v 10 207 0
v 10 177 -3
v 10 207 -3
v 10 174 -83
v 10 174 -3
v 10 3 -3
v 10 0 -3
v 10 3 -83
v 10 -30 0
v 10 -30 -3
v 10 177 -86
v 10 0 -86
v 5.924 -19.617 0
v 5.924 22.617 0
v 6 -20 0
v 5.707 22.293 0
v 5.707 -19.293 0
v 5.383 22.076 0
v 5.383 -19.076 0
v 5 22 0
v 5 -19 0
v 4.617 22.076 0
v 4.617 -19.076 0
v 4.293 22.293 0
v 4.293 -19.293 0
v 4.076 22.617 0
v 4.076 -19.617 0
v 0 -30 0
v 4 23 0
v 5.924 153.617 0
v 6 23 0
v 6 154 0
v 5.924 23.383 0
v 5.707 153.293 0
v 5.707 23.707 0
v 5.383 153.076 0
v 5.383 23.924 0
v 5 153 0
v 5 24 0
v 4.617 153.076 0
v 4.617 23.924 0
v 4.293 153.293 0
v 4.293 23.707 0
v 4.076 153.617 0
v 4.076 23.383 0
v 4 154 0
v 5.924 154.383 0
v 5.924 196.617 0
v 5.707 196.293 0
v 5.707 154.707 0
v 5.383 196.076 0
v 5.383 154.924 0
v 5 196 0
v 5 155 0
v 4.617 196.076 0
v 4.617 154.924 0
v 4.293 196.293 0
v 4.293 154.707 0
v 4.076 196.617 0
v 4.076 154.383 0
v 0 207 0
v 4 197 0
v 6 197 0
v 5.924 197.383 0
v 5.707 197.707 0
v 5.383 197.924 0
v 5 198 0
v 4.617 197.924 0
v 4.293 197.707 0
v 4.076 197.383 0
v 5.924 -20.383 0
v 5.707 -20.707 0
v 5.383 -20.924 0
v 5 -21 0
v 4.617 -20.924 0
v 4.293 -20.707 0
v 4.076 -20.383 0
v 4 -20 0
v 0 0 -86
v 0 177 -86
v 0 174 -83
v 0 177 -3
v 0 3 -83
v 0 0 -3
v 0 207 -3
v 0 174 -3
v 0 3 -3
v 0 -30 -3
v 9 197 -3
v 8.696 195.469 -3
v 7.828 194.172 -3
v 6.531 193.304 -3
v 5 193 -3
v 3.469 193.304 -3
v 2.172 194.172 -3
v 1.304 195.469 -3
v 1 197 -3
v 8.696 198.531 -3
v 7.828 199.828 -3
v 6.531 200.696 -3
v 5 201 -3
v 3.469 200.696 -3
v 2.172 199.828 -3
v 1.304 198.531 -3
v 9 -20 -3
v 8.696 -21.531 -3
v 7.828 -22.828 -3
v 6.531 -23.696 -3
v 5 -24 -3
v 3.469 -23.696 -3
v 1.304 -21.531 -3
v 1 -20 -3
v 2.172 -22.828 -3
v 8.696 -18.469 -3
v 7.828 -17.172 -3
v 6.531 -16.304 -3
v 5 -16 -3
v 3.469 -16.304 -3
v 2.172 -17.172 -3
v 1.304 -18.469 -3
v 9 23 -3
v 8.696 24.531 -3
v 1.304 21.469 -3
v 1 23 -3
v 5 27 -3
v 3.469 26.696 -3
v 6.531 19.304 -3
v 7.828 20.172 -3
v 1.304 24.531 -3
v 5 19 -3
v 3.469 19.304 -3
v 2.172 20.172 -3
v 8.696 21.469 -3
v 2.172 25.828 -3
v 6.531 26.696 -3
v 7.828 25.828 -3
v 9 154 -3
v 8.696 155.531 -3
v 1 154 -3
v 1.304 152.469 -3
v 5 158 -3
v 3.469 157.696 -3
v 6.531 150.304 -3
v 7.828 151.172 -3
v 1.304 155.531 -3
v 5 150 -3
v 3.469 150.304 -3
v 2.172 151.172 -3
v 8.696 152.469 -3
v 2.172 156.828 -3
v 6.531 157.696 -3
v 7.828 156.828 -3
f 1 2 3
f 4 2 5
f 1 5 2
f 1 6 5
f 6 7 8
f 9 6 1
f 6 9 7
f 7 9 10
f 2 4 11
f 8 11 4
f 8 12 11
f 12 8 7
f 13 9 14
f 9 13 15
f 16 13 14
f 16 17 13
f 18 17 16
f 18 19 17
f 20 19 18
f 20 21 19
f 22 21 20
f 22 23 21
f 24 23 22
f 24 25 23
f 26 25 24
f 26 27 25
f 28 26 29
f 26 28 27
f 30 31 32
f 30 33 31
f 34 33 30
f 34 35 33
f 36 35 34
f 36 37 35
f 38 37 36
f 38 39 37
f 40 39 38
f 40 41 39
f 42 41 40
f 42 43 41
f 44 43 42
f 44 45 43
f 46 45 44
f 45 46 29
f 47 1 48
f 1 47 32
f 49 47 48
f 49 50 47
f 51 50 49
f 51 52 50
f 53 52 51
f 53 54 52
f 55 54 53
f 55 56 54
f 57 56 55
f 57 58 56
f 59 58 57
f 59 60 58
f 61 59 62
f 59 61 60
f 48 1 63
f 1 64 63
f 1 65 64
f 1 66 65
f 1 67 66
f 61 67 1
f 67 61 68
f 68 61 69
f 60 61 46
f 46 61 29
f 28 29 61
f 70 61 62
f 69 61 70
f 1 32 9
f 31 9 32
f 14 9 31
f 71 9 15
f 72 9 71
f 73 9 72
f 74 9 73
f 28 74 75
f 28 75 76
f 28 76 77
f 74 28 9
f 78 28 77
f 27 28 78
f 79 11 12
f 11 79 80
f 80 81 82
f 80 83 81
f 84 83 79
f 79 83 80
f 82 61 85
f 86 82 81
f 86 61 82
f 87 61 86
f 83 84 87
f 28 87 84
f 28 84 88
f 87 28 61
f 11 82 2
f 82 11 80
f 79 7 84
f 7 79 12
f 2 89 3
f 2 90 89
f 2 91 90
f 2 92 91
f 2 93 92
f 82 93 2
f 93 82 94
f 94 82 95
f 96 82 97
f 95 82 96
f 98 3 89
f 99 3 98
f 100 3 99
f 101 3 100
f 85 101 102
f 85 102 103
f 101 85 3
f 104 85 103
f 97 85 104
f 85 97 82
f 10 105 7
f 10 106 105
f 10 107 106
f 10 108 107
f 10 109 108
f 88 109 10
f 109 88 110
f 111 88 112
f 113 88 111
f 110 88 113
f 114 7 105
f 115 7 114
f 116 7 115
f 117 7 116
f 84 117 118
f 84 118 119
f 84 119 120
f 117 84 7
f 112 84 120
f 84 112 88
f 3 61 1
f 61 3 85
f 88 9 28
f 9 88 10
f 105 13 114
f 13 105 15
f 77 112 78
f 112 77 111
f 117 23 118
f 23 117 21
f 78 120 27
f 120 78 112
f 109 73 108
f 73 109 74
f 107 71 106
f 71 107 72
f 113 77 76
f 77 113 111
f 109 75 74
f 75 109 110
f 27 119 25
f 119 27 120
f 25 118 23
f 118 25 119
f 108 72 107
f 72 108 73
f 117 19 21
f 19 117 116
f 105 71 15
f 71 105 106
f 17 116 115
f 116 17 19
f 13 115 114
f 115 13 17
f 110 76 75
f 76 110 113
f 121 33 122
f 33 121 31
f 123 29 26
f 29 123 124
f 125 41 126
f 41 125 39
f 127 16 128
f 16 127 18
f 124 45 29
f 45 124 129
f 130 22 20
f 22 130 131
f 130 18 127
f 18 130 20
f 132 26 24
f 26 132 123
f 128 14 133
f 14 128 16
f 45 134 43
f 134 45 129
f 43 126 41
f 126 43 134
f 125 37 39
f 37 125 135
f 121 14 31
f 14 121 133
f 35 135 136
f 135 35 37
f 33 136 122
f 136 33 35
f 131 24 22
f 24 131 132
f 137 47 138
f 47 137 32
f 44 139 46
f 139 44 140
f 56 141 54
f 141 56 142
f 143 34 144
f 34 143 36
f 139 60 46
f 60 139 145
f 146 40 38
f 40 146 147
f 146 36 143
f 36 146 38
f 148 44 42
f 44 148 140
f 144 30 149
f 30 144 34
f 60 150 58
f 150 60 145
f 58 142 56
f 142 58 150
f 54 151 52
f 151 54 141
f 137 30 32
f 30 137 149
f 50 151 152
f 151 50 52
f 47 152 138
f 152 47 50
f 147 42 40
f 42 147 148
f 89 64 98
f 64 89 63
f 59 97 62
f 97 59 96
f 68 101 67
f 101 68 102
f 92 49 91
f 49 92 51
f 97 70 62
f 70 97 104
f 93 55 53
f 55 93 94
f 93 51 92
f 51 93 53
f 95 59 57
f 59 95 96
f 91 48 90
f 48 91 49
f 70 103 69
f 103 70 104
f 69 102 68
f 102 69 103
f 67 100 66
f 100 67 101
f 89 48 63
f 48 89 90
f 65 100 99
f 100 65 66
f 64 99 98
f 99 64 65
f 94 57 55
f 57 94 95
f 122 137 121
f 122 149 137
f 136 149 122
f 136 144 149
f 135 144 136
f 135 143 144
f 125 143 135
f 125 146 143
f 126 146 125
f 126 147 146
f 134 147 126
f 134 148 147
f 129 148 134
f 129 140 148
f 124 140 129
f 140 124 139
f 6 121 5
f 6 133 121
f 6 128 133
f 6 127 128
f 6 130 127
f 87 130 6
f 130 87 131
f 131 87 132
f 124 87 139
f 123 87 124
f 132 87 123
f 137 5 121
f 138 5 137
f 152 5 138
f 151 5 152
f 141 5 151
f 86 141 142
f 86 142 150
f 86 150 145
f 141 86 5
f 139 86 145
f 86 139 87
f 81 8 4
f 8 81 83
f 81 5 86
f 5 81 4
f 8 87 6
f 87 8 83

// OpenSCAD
W = 10;
D = 171;
H = 80;
thick = 3;

difference() {
    union() {
        translate([0, 0, -H - thick * 2])
            cube([W, D + thick * 2, H + thick * 2]);
        translate([0, -30, -thick])
            cube([W, D + thick * 2 + 60, thick]);
    }
    translate([-1, thick, -H - thick])
        cube([W + 2, D, H]);
    for (y = [-20, 20 + thick, D + thick - 20, D + thick * 2 + 20])
            translate([W / 2, y, -thick - 1])
            cylinder(r1 = 5, r2 = 0, h = 5);
}
